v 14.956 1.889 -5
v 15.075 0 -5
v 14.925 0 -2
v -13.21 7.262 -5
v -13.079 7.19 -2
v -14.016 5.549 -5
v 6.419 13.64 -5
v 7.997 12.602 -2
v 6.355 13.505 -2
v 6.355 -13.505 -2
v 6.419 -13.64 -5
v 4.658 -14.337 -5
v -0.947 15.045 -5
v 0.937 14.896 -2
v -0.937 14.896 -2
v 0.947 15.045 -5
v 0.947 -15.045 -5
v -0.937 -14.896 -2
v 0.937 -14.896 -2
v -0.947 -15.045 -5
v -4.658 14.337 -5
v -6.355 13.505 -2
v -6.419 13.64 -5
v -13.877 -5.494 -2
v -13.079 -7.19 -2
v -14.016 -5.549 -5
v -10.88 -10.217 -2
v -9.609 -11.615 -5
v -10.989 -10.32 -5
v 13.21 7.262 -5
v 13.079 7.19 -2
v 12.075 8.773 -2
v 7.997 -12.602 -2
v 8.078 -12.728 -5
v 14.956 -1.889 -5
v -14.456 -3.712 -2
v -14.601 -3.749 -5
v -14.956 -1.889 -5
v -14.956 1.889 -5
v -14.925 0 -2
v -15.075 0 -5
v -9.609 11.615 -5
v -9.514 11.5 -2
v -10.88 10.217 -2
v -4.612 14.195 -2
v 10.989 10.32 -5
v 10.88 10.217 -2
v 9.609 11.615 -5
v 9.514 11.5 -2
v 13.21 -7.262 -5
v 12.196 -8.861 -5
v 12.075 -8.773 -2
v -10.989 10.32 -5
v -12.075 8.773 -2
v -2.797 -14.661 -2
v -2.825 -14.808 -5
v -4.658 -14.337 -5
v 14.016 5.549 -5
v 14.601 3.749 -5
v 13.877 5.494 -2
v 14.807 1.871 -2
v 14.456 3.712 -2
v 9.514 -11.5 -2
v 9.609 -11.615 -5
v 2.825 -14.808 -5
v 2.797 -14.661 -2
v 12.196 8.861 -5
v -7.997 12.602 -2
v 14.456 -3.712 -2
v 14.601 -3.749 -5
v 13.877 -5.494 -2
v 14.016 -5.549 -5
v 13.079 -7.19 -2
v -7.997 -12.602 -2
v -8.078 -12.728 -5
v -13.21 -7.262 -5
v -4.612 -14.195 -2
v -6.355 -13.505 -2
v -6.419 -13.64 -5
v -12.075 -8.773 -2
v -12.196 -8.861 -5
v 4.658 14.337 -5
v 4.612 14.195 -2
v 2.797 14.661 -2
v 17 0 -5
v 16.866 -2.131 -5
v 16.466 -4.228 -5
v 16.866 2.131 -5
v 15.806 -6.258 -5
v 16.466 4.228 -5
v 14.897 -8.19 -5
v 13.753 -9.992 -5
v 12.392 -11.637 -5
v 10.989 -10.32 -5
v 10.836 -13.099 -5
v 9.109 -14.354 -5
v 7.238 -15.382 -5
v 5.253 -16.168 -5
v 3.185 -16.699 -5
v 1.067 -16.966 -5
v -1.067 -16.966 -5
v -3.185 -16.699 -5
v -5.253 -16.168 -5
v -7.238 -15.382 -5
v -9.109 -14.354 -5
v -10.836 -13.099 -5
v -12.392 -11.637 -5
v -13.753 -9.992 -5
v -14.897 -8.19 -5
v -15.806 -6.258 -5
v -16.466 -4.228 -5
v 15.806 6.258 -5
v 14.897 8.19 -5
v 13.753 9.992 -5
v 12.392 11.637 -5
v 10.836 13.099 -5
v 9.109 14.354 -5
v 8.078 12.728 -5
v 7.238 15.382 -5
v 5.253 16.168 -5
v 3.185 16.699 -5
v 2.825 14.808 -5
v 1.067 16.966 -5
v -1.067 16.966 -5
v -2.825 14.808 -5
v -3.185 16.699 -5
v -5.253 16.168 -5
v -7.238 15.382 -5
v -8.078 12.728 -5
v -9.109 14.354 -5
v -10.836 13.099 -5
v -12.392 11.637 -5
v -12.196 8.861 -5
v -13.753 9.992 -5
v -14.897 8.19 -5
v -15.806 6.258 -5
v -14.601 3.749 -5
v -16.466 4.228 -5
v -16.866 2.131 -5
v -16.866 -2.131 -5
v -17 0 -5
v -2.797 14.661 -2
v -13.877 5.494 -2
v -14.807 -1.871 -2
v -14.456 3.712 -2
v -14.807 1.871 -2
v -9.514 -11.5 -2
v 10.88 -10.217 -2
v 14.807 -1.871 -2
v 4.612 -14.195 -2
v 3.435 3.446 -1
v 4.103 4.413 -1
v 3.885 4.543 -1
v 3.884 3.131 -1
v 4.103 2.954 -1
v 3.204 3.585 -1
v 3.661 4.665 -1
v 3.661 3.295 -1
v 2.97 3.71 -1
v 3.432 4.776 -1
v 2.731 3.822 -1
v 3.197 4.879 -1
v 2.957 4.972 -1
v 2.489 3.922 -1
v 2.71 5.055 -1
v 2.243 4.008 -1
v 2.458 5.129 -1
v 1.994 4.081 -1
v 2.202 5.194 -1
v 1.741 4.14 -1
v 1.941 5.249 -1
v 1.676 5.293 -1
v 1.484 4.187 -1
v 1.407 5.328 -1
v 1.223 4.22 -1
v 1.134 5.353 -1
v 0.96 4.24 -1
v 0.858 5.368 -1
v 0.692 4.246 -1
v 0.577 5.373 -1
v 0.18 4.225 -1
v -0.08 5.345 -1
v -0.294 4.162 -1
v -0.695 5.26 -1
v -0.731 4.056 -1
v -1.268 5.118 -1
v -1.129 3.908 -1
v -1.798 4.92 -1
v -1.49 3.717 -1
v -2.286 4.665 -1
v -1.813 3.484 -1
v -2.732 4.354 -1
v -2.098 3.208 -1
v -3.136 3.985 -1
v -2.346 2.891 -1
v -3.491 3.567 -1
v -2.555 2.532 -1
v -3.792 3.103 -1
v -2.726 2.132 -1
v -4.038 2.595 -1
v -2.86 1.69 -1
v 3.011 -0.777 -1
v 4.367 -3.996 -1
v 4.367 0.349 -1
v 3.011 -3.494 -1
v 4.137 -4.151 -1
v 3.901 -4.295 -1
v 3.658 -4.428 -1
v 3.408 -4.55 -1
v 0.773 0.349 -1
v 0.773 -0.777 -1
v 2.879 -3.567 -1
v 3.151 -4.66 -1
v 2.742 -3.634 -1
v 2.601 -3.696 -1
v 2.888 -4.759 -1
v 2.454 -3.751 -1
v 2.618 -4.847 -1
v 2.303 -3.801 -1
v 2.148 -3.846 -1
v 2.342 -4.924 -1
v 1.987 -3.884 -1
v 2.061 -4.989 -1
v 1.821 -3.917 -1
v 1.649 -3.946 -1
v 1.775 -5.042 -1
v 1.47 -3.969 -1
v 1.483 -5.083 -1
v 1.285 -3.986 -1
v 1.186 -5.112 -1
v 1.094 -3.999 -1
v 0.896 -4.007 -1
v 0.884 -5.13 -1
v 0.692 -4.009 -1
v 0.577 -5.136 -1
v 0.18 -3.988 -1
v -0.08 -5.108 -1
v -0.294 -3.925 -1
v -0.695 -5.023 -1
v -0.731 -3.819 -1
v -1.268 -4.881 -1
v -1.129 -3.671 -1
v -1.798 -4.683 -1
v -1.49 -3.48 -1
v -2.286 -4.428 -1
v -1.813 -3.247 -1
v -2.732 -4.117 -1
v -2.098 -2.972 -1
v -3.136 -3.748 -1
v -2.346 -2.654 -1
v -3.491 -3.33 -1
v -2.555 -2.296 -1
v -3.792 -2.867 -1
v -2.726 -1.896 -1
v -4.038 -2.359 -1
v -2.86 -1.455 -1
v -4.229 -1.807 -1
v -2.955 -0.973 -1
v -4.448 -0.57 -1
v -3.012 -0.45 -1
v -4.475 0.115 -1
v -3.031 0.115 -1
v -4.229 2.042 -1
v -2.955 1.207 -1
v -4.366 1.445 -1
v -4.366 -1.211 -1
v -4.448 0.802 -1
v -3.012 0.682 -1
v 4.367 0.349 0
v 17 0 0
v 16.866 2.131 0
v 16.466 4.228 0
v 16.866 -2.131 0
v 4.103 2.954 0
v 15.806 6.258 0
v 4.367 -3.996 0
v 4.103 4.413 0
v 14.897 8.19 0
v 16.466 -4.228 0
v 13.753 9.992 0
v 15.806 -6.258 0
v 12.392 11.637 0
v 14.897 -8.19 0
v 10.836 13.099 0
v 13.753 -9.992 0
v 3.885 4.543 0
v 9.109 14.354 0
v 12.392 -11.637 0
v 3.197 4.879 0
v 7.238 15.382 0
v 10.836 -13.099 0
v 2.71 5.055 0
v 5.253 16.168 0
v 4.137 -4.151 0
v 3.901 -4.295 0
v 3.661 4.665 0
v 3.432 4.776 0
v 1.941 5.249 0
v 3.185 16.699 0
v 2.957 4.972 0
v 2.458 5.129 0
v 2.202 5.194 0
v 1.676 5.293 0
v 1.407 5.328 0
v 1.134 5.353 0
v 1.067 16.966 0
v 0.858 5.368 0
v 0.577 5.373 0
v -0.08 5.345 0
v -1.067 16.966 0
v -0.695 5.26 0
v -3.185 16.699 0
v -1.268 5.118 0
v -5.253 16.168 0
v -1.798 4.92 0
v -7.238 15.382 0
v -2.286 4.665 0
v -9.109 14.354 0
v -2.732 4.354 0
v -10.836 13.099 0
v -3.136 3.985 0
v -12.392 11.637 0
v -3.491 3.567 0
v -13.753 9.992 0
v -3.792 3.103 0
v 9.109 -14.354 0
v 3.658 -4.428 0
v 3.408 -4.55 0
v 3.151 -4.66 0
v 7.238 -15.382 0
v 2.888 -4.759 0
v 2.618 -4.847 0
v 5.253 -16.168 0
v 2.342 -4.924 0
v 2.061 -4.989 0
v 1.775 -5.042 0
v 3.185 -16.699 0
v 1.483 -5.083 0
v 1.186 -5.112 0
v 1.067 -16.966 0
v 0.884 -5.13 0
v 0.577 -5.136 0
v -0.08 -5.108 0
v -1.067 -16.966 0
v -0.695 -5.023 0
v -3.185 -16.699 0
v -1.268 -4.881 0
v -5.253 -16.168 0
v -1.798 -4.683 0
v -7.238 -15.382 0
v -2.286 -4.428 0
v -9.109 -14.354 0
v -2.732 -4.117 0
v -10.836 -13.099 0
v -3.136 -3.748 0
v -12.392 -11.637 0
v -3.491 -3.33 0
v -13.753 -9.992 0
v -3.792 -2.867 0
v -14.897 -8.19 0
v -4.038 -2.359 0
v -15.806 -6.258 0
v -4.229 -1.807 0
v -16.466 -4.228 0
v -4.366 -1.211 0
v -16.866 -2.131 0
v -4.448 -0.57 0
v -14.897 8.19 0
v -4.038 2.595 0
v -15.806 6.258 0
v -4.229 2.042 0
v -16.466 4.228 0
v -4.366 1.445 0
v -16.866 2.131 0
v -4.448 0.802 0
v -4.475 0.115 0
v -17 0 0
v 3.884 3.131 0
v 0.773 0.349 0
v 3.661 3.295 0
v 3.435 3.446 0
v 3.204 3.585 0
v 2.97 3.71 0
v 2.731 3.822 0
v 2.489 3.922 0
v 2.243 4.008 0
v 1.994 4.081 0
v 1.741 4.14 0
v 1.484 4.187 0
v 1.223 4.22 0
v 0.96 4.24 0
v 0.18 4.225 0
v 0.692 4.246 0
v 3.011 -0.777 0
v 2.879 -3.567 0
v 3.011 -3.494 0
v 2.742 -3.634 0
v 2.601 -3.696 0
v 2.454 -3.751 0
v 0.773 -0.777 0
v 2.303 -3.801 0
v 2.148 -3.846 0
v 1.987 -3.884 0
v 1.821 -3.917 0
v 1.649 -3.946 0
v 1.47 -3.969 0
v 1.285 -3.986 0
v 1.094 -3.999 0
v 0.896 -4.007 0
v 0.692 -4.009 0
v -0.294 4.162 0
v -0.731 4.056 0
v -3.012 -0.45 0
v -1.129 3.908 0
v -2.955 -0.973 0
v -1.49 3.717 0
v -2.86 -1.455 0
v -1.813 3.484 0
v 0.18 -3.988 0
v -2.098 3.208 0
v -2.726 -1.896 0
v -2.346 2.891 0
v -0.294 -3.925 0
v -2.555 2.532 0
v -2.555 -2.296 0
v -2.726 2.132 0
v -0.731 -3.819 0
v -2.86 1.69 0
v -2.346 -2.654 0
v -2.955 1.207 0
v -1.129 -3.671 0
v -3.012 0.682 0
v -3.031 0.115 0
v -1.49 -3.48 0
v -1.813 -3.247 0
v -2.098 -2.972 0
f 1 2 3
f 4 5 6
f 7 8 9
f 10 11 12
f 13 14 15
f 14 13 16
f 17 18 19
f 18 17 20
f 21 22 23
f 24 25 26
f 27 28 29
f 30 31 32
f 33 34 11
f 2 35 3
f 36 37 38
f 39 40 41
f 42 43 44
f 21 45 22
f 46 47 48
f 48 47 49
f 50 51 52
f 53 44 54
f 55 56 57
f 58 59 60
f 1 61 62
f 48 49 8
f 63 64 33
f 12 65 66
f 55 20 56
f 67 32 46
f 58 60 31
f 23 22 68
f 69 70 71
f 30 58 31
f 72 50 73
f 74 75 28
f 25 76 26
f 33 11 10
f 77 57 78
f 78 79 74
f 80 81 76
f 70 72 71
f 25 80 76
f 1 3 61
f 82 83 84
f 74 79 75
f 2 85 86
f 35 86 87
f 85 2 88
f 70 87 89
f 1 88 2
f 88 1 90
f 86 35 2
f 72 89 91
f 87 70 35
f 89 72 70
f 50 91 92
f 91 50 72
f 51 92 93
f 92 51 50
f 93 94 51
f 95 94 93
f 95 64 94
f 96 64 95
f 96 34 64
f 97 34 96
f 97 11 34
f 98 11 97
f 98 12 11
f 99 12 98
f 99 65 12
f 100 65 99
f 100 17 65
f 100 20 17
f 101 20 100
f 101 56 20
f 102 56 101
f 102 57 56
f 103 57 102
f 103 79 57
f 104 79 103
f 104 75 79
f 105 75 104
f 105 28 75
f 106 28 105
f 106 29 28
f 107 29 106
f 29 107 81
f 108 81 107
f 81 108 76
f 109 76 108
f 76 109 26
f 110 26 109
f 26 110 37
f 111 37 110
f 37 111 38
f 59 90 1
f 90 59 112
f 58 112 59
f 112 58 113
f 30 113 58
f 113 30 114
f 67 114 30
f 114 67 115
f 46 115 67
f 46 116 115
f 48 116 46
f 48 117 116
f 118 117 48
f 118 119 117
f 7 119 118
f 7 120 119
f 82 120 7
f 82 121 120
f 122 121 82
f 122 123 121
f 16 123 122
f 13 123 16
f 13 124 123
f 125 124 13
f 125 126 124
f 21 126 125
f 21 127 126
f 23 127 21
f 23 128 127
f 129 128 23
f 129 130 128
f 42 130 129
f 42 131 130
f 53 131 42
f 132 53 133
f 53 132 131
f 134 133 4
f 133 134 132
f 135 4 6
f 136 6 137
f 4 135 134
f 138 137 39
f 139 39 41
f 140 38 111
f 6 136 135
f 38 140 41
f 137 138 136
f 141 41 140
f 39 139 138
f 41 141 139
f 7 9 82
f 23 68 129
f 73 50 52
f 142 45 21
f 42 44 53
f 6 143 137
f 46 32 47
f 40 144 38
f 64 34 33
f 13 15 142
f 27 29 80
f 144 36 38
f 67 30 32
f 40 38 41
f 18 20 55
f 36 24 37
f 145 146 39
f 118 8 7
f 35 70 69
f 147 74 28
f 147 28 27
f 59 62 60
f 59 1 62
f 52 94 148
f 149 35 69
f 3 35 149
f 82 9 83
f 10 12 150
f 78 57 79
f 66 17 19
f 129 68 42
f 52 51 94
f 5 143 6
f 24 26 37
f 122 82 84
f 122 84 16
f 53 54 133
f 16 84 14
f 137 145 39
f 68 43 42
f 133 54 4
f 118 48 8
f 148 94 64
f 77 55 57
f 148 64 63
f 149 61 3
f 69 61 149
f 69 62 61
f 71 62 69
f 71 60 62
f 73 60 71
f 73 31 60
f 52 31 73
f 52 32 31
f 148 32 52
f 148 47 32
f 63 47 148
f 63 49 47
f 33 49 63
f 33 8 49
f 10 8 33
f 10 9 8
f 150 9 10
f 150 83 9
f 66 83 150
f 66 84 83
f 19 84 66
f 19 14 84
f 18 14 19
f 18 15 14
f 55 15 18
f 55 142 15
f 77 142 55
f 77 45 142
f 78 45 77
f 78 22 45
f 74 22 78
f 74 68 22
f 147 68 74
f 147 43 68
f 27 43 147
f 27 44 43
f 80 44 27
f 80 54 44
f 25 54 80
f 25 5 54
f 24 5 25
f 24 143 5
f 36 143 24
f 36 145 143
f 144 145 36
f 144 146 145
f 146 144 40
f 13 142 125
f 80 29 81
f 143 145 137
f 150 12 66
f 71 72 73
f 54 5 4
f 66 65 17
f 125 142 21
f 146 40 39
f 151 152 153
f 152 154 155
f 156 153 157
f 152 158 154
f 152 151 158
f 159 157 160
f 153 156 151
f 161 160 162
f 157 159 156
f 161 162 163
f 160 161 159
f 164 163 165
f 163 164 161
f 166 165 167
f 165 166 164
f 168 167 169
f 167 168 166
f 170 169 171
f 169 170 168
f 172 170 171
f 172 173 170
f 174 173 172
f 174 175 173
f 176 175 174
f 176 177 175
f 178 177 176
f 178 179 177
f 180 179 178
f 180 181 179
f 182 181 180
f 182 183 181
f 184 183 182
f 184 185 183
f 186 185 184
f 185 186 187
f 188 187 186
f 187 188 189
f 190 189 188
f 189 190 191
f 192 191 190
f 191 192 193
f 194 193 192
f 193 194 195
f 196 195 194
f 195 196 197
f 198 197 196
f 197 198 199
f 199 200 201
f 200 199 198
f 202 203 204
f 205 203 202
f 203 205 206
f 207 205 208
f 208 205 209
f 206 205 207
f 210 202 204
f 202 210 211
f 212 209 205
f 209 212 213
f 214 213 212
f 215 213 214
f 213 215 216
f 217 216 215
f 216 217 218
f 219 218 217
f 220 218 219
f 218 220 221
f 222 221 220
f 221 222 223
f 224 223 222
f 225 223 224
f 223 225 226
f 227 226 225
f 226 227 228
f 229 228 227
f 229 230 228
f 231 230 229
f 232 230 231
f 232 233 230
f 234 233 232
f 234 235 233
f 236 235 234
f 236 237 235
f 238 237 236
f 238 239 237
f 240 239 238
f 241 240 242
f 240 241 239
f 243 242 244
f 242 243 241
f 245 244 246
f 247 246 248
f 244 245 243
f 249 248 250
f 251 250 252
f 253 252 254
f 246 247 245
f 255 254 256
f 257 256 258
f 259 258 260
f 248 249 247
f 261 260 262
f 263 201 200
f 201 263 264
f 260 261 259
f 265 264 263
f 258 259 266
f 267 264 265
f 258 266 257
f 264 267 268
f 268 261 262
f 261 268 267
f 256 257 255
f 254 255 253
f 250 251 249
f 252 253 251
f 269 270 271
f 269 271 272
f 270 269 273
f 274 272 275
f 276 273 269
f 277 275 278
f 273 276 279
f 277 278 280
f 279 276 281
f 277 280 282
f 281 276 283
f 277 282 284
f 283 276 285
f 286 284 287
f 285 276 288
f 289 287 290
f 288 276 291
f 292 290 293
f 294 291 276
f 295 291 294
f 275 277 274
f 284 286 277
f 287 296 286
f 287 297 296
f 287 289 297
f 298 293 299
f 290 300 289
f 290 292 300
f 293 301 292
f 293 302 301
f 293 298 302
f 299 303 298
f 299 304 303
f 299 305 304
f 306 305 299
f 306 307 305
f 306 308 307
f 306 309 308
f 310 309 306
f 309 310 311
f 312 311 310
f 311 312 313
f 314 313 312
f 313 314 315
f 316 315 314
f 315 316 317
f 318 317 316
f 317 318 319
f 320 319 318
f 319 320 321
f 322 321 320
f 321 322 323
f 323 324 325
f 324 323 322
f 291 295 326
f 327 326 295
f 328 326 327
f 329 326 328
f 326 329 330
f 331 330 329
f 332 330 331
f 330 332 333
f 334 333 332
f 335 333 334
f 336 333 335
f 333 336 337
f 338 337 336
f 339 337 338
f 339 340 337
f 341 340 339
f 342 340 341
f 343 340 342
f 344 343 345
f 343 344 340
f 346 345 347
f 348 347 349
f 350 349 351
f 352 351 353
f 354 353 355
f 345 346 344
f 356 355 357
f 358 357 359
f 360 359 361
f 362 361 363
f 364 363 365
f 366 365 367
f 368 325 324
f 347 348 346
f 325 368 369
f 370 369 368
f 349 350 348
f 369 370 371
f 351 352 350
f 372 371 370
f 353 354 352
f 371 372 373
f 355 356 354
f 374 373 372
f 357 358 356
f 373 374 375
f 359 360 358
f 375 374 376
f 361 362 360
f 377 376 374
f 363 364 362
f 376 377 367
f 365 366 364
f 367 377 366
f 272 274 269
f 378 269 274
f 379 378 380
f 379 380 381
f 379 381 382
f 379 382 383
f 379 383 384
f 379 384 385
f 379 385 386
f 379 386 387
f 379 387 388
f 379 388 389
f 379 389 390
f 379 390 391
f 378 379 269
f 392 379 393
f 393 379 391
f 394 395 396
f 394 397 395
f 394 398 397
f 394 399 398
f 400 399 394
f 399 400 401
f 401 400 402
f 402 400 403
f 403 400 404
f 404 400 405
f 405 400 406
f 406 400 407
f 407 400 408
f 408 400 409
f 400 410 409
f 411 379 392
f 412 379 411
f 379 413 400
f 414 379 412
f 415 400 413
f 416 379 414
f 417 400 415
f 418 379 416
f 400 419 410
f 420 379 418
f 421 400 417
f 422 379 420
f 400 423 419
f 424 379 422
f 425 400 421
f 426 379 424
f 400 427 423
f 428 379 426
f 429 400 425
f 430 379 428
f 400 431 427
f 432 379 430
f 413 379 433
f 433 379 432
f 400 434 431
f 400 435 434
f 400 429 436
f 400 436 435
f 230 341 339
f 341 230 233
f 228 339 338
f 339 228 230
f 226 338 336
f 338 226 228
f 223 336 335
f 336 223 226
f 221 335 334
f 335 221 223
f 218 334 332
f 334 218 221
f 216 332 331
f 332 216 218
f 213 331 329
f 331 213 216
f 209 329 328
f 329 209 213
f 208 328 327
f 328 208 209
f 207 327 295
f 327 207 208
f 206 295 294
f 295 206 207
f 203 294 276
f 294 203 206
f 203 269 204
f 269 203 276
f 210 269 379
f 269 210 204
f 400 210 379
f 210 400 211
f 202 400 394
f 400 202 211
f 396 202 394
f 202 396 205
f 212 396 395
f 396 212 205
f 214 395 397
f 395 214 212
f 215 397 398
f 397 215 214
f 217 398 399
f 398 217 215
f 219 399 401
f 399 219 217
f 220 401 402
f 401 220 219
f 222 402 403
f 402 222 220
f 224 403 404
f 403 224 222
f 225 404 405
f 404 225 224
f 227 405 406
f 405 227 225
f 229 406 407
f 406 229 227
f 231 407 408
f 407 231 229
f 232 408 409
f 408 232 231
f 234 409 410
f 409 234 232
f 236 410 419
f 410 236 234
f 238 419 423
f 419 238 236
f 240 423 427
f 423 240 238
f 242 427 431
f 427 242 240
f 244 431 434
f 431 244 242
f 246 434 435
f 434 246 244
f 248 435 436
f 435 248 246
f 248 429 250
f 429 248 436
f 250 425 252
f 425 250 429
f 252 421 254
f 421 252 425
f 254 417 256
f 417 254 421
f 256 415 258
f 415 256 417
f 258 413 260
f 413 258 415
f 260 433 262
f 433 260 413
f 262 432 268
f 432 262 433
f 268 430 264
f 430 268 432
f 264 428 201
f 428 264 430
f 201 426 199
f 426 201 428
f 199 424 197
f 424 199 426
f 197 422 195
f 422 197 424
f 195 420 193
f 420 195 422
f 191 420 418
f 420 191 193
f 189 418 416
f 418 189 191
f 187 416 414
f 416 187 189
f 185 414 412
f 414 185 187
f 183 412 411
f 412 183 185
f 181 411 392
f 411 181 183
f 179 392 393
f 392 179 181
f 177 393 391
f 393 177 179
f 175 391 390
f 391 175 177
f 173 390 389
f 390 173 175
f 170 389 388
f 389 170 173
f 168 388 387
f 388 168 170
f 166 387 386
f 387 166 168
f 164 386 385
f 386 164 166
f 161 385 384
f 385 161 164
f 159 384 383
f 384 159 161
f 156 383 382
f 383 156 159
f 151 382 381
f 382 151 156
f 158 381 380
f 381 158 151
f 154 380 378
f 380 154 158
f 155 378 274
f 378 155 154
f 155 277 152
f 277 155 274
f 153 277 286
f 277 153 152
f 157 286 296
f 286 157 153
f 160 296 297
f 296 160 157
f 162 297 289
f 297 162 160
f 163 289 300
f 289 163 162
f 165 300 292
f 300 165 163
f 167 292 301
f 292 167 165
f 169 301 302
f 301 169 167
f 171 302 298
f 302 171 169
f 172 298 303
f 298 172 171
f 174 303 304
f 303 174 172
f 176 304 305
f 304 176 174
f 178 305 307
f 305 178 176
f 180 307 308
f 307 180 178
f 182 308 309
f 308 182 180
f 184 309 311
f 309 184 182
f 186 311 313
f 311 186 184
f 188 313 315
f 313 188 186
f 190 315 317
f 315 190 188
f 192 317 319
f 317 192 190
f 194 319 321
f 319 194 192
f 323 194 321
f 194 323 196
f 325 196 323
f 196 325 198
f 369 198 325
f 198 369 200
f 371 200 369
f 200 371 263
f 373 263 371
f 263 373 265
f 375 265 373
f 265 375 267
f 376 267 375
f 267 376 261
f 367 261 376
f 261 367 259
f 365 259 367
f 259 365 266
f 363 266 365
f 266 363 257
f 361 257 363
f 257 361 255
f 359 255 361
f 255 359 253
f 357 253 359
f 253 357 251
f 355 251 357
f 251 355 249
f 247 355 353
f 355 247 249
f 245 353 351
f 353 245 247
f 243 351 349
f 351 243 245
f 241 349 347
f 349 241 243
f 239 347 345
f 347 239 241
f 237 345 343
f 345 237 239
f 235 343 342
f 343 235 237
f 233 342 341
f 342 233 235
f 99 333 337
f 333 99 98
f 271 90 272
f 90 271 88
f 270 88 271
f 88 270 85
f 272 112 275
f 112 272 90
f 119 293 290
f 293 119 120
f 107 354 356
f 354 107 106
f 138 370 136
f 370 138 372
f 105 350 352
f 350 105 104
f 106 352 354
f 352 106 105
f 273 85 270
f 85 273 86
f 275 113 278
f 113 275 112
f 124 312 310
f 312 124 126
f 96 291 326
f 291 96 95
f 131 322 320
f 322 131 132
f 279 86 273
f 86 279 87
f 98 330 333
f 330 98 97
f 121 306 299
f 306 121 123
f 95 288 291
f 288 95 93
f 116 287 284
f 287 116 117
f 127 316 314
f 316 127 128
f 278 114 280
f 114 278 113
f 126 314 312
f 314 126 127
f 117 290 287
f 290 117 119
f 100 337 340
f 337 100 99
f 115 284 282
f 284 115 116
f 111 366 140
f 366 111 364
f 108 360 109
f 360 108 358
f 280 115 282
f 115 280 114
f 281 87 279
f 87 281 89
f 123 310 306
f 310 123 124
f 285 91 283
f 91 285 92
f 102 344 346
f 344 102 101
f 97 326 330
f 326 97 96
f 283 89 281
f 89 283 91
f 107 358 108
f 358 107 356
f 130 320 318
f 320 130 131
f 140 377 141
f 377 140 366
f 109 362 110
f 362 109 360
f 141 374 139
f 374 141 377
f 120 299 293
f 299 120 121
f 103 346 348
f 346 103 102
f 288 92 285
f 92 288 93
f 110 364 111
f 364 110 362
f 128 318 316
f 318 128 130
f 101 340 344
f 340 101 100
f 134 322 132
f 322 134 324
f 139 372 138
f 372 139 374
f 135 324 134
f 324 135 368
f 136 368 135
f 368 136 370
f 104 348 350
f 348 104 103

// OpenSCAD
$fn = 50;

difference() {
	union() {
		translate(v = [0, 0, -5.0]) {
			cylinder(h = 5, r = 17.0);
		}
	}
	union() {
		#translate(v = [0, 0, -5.0]) {
			cylinder(h = 3, r1 = 15.075, r2 = 14.925);
		}
		translate(v = [0, 0, -1]) {
			linear_extrude(height = 1) {
				text(font = "Impact", halign = "center", size = 10, text = "G", valign = "center");
			}
		}
	}
}
